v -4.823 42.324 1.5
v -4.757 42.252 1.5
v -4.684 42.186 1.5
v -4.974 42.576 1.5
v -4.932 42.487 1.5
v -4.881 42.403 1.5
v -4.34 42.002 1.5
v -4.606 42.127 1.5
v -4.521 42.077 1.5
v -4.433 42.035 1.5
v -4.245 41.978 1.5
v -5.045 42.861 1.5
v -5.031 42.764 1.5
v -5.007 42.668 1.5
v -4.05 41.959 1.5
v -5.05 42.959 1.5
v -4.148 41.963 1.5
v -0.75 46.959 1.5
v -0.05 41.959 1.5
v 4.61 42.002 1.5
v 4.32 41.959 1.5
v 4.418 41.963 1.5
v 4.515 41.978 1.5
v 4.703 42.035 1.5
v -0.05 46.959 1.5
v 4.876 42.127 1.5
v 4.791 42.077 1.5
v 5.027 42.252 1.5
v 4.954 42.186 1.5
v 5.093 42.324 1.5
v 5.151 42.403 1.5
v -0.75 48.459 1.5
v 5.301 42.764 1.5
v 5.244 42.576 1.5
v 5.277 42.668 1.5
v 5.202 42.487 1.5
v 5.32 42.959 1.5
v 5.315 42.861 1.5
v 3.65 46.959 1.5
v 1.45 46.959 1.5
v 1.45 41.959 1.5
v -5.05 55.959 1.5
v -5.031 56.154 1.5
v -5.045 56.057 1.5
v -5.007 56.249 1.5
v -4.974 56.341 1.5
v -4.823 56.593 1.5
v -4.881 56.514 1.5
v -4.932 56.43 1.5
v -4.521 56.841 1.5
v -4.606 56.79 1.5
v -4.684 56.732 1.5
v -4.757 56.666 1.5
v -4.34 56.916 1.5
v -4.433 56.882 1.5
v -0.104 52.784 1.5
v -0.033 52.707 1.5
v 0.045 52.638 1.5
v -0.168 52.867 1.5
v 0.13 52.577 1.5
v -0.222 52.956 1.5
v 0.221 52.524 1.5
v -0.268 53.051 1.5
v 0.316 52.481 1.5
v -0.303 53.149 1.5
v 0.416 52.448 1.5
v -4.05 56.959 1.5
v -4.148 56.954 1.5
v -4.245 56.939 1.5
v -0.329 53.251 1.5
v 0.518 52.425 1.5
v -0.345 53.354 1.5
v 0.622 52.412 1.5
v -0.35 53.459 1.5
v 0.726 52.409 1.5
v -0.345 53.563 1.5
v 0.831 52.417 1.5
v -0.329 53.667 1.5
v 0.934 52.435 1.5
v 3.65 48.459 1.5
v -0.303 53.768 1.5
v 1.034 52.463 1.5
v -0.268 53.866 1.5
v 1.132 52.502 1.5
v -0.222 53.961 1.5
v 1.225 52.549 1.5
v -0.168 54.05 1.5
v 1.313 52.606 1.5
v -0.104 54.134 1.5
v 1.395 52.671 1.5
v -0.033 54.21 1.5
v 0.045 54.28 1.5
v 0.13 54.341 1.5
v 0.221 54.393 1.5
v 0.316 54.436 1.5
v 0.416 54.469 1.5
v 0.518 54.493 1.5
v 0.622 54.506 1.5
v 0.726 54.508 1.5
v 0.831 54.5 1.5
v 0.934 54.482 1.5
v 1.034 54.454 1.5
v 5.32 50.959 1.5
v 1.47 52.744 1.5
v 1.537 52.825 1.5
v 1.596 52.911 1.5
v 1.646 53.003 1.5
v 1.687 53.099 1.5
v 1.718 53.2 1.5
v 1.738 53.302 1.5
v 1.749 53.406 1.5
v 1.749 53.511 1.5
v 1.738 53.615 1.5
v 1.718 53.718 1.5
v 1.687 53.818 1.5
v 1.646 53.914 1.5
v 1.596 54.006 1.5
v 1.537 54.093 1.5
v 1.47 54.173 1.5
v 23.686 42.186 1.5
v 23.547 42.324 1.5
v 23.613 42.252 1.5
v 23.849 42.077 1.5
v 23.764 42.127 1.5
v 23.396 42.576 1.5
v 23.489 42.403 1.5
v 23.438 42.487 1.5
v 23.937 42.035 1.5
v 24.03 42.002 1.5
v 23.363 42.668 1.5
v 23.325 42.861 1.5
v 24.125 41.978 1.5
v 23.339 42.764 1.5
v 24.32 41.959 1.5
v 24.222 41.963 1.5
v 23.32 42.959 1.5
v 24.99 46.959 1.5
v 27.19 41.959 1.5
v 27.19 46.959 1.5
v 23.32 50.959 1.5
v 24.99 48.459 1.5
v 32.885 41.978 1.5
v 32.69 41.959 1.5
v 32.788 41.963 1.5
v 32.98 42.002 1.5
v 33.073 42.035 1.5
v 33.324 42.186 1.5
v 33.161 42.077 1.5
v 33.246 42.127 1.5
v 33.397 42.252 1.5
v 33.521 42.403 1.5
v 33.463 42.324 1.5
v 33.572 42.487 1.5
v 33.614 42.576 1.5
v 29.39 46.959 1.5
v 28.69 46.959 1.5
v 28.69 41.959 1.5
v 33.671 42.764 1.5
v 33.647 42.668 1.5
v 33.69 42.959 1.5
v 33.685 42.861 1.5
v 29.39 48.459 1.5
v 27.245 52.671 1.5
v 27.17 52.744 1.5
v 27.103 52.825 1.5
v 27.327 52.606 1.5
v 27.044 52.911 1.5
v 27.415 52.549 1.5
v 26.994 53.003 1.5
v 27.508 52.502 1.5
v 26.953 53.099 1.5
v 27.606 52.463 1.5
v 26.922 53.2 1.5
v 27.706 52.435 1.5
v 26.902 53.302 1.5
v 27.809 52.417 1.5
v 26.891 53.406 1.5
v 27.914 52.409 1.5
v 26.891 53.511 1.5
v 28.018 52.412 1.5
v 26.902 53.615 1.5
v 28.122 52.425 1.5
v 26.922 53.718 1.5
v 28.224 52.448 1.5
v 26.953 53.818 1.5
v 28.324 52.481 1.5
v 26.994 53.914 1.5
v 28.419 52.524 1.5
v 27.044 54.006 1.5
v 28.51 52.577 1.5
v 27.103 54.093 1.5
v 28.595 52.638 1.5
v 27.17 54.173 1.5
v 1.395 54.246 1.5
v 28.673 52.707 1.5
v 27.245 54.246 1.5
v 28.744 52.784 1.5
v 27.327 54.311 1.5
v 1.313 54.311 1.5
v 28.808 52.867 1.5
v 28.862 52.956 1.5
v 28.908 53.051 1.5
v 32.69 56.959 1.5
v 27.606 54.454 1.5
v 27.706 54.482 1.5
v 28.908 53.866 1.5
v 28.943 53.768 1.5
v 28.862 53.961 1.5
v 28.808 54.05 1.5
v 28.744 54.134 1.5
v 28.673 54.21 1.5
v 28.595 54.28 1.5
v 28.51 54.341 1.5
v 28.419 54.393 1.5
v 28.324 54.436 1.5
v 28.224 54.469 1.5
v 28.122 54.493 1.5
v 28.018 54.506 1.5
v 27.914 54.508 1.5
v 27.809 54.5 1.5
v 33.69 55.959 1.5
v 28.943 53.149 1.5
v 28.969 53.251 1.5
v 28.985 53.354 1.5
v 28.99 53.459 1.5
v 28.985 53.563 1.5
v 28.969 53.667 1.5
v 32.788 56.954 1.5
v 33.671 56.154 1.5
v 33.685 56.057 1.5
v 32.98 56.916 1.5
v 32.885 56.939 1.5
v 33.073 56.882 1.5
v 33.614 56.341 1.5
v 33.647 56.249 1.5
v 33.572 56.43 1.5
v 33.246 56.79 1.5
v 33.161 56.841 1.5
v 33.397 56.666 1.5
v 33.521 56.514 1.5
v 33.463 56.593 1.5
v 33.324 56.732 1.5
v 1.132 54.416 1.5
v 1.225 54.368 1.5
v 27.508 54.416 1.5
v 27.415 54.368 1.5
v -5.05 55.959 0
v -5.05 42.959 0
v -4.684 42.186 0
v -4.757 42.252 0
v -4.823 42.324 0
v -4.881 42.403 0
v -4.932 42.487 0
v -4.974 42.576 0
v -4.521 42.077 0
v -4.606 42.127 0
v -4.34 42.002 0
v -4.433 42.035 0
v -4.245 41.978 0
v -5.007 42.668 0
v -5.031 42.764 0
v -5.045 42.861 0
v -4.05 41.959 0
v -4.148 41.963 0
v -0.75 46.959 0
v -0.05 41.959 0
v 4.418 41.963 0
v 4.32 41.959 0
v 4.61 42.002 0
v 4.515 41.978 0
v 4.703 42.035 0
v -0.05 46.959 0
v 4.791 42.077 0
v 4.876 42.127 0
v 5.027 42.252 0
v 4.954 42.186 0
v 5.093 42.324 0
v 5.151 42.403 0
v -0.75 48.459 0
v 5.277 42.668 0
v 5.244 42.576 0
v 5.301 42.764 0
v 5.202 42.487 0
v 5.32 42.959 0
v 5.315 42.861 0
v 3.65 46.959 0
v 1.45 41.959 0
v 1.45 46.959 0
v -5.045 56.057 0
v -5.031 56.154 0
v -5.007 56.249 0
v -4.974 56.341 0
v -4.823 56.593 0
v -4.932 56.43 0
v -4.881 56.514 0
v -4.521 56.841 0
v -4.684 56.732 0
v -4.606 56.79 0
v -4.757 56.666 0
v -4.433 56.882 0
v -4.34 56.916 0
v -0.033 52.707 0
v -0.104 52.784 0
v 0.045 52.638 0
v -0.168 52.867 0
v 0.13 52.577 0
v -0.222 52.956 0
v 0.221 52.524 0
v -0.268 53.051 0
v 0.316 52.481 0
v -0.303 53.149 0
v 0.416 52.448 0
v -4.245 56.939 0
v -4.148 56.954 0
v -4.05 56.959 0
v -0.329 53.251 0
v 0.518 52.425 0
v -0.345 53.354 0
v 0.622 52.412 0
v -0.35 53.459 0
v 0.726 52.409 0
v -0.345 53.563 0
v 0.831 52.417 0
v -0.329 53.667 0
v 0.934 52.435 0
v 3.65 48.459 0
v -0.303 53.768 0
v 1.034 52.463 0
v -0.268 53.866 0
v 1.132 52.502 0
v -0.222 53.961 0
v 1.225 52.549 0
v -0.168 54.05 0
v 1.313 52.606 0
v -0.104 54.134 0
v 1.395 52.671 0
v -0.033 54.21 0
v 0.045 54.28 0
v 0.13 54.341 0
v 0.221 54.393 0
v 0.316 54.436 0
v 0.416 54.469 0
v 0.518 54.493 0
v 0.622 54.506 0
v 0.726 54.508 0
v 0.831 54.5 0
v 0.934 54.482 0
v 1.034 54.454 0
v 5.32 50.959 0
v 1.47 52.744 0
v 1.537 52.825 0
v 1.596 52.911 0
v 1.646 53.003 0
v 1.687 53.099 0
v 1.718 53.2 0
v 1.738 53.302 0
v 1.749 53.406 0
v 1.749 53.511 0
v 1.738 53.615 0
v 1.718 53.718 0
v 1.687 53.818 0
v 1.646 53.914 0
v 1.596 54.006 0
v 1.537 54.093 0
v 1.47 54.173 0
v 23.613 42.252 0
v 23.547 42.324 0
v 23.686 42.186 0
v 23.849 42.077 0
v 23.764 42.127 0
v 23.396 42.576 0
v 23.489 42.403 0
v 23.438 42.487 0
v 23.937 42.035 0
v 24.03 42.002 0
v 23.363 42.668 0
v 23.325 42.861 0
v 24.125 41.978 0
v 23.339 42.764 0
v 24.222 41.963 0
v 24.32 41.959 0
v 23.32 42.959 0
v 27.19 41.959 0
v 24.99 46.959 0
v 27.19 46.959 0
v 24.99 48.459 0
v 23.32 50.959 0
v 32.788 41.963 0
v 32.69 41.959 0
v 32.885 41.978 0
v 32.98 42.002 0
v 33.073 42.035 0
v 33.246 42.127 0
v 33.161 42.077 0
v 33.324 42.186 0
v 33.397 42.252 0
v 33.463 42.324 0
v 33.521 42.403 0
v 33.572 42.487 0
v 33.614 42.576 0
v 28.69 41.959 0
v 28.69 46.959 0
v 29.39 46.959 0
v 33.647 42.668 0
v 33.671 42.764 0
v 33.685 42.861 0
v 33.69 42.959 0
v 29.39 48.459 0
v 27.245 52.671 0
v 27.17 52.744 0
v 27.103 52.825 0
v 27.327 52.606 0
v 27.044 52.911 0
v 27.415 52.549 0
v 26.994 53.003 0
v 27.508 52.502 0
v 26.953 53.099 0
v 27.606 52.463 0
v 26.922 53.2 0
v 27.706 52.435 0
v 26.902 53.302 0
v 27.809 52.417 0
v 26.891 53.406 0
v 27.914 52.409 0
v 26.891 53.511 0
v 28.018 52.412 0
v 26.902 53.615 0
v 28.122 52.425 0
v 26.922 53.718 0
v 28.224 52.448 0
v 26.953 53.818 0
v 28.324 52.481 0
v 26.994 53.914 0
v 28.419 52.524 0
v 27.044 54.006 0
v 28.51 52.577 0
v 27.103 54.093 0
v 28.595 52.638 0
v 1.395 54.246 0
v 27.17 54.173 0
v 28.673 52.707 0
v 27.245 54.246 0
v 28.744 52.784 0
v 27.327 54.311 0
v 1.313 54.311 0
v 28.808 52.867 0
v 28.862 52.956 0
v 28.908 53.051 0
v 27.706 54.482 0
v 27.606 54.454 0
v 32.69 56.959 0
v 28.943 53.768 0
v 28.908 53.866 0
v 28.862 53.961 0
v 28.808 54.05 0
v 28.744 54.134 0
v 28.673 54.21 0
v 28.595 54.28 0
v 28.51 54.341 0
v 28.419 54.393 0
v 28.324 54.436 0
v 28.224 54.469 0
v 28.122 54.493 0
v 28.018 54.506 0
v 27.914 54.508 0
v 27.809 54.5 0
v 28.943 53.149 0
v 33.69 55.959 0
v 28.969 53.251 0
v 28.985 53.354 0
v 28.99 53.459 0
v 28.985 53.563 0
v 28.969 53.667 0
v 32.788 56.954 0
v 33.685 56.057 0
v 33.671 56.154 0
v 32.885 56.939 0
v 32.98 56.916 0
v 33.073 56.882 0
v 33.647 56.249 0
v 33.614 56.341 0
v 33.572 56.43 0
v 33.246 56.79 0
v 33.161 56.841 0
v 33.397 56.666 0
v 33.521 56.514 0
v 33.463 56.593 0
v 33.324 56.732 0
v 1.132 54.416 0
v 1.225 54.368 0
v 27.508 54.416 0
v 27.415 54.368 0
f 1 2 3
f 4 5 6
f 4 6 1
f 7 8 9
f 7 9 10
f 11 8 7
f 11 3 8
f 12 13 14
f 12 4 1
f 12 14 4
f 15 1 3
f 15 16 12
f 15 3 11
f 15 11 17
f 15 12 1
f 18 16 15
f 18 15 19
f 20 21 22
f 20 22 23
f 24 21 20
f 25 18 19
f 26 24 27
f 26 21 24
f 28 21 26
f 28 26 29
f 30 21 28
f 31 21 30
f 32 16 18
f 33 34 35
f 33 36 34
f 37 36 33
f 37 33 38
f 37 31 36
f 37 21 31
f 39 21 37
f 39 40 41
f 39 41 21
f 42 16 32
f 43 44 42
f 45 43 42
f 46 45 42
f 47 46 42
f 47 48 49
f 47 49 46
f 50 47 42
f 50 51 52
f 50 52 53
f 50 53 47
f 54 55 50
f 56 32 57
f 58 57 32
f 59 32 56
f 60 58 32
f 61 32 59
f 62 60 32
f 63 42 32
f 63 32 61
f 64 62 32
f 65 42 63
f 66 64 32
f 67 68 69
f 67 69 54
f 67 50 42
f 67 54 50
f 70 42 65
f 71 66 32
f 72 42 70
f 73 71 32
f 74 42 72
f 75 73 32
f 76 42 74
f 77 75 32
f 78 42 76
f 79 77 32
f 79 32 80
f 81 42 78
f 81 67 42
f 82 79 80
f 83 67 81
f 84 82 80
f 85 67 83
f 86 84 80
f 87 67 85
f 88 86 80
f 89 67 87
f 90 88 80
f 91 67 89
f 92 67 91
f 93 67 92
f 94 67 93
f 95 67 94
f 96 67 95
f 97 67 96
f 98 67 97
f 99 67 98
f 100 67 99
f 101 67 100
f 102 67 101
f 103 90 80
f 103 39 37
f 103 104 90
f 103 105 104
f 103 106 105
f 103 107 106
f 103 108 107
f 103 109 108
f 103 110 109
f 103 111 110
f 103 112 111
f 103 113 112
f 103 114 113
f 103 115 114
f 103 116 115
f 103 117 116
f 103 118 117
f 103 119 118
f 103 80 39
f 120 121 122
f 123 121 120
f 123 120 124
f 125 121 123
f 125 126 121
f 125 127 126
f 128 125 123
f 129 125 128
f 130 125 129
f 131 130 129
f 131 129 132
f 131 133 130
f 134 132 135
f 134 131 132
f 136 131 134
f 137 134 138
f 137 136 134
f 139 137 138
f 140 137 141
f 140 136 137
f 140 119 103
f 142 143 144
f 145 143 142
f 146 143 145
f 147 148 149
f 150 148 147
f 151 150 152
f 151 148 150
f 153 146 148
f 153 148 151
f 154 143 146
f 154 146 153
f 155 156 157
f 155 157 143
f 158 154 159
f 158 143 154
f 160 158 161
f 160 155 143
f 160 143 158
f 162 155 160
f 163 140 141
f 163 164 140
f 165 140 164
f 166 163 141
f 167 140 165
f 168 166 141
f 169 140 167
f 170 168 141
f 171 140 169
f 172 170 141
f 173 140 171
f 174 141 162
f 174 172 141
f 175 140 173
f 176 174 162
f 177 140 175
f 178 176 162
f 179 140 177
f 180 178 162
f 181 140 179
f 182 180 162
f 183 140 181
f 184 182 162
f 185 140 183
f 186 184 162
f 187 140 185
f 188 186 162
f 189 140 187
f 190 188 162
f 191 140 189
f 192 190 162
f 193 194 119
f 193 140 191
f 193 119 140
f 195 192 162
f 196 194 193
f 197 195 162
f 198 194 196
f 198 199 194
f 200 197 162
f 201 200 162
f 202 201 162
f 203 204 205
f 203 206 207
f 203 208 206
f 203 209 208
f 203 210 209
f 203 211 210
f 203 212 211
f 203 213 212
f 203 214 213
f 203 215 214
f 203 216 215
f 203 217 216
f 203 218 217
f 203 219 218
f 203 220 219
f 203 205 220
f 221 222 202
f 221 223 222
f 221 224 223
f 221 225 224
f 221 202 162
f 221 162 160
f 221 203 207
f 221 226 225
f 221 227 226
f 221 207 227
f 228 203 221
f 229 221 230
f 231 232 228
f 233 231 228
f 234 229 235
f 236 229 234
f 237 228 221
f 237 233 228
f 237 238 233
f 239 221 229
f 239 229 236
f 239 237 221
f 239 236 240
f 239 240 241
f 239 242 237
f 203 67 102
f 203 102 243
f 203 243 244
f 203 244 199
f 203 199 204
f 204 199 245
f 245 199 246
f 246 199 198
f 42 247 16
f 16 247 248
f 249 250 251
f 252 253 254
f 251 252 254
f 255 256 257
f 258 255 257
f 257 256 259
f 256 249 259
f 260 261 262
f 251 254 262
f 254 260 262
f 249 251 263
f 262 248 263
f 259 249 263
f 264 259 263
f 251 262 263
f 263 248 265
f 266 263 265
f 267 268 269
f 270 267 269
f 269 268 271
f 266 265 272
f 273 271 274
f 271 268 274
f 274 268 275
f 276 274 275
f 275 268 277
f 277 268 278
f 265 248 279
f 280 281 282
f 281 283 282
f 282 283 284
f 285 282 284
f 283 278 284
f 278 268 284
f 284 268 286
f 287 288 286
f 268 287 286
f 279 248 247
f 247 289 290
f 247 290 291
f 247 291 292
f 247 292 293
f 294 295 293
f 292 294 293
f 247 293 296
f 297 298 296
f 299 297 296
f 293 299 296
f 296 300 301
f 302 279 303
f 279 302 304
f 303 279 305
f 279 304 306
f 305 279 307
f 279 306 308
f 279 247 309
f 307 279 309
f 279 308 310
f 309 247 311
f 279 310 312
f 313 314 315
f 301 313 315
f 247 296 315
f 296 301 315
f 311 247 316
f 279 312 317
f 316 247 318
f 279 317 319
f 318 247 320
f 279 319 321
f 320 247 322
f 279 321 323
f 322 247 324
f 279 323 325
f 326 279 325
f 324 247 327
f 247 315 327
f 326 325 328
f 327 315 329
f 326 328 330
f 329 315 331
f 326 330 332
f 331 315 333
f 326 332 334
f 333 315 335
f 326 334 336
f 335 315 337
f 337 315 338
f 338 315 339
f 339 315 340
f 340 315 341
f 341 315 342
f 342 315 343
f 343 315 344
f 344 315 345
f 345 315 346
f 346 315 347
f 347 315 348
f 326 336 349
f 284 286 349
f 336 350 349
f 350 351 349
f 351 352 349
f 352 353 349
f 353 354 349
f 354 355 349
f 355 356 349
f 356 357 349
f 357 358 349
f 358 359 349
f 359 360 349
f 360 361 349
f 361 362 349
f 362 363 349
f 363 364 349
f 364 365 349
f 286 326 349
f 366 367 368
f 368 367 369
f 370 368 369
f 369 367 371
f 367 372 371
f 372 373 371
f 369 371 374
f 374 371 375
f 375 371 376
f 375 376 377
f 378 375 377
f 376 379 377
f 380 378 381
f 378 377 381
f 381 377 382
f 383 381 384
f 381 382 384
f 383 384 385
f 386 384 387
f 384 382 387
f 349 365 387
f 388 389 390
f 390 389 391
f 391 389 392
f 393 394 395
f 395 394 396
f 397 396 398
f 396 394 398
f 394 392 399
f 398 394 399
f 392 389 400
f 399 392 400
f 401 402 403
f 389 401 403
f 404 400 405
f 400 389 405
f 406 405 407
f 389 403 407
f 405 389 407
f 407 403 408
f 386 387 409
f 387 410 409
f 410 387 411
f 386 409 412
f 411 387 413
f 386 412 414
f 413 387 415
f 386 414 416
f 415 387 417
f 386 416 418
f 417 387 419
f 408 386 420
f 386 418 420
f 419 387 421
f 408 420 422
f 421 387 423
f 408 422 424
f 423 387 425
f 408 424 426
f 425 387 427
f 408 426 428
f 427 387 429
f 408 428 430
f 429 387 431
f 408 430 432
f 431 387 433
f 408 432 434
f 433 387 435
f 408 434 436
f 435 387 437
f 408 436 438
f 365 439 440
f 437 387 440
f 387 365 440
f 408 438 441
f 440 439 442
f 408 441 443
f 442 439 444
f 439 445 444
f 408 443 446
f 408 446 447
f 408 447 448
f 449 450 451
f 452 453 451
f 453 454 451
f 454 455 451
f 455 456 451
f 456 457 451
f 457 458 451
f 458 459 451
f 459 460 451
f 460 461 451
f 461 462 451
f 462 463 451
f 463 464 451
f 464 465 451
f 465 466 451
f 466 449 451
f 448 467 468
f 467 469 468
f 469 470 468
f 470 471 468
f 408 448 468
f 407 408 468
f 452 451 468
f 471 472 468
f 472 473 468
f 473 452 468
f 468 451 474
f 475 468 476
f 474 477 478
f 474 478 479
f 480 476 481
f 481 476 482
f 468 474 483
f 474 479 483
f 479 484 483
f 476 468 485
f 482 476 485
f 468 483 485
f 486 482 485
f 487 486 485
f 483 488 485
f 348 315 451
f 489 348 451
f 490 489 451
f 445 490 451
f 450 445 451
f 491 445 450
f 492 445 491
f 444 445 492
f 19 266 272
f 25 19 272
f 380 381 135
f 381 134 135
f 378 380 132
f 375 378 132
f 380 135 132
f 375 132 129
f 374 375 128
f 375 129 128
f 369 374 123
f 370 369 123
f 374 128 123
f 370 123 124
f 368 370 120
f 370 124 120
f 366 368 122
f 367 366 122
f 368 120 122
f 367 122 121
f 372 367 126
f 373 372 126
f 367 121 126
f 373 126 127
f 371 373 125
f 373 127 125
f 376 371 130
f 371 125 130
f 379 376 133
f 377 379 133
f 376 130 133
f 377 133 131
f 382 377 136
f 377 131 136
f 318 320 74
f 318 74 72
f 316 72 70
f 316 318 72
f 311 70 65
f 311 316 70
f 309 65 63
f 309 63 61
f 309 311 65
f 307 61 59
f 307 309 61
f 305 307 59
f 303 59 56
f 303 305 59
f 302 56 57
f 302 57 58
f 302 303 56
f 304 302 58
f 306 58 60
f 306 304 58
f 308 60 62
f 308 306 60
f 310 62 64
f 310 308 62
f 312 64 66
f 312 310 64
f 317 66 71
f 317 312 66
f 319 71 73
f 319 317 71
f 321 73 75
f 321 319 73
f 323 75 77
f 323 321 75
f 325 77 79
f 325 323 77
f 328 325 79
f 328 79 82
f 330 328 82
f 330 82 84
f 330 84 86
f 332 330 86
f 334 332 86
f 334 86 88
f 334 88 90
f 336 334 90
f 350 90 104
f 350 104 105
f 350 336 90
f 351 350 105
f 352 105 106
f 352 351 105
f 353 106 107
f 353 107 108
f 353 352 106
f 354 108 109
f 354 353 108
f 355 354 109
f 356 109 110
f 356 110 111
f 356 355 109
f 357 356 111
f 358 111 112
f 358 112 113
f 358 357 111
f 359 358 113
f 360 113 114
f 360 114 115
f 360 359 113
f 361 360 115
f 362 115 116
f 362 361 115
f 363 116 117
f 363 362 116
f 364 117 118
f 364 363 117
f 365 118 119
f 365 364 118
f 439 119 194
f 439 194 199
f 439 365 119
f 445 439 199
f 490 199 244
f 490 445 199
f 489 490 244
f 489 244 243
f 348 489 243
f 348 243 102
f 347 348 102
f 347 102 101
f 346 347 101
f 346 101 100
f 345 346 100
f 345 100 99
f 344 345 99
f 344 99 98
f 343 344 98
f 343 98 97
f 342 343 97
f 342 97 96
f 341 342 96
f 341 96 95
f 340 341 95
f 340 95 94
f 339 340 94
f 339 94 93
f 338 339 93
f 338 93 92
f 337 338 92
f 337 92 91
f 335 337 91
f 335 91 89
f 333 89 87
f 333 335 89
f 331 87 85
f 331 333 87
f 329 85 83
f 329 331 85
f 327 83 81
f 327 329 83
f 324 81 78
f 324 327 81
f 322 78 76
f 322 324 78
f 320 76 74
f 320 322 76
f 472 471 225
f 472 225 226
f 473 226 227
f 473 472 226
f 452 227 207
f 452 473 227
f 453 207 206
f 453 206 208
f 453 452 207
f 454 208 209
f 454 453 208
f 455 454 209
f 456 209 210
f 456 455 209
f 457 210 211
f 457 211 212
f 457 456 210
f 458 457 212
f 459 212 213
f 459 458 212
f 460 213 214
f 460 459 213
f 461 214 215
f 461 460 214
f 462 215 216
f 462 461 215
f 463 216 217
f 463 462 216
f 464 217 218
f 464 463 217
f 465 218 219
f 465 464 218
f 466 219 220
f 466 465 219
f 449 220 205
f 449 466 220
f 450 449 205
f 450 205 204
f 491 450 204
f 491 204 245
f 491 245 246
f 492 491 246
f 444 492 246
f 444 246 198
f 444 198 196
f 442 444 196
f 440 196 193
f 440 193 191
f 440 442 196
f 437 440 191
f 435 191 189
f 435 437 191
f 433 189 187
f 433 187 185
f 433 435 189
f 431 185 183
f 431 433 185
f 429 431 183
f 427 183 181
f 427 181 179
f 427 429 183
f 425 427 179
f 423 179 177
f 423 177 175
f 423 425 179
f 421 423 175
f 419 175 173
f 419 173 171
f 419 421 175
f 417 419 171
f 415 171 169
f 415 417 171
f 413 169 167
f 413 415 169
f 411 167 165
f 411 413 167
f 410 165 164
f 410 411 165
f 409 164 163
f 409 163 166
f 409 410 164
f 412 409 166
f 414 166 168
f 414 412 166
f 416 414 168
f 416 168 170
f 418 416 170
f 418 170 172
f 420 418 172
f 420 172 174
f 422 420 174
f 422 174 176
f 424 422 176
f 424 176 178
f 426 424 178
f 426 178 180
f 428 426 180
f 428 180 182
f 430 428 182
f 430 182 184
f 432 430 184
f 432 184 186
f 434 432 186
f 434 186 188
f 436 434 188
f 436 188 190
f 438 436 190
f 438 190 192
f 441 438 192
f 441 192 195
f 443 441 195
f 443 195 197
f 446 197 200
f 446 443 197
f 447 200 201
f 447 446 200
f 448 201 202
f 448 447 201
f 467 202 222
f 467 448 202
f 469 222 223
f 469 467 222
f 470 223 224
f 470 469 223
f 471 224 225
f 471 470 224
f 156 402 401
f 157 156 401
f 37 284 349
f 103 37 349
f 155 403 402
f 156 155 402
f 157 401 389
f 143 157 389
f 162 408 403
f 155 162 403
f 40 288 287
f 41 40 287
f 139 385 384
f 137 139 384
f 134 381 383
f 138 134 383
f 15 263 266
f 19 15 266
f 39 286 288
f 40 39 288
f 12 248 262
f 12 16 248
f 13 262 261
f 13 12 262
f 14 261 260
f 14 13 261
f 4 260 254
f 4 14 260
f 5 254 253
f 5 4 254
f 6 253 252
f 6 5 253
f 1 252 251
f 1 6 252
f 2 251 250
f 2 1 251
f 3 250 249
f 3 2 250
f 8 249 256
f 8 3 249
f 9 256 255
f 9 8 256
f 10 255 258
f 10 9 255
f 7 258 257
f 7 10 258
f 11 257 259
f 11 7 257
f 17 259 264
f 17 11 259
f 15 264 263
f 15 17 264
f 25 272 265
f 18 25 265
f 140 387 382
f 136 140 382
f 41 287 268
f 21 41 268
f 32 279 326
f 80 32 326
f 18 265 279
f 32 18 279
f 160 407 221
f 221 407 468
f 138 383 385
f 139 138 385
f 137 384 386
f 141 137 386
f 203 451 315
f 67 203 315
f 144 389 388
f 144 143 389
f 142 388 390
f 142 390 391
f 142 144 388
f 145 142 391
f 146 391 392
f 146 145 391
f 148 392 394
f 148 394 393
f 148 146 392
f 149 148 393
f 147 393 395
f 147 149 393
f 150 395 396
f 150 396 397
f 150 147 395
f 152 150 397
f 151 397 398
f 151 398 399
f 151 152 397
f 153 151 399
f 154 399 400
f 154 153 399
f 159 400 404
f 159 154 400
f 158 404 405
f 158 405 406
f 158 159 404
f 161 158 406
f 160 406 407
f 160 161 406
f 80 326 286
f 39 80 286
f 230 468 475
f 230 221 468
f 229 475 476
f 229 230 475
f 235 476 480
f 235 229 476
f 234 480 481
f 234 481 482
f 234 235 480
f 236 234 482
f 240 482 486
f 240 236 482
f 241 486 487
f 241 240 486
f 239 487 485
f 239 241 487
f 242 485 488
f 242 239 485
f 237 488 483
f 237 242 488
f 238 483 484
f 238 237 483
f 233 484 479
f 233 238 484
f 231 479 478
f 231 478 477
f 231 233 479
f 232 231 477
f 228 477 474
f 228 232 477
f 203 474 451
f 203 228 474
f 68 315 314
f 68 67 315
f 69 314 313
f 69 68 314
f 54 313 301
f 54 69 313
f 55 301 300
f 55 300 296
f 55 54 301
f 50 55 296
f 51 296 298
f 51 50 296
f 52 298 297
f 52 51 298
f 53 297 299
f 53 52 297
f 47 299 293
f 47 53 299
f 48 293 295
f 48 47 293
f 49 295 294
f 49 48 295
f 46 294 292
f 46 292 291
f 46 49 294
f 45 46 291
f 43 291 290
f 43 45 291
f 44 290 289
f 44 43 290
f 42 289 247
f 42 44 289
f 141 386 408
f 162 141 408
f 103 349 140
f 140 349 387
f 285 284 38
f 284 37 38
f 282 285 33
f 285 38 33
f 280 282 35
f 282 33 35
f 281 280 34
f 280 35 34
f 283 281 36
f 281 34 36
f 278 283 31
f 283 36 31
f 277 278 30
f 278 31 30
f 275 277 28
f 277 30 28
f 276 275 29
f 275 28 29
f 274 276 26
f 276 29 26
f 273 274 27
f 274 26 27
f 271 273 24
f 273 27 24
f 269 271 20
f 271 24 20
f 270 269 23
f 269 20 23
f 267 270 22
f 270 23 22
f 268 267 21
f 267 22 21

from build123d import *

# Parameters (mm, degrees)
SKETCH_1_R      = 1.05
EXTRUDE_1_DEPTH = 1.5
FILLET_1_R      = 1


with BuildPart() as part:
    # 草图1 → 凸台-拉伸1 (new body)
    with BuildSketch(Plane.XY):
        Polygon((23.32, 41.958612035), (27.19, 41.958612035), (27.19, 46.958612035), (24.99, 46.958612035), (24.99, 48.458612035), (29.39, 48.458612035), (29.39, 46.958612035), (28.69, 46.958612035), (28.69, 41.958612035), (33.69, 41.958612035), (33.69, 56.958612035), (14.32, 56.958612035), (-5.05, 56.958612035), (-5.05, 41.958612035), (-0.05, 41.958612035), (-0.05, 46.958612035), (-0.75, 46.958612035), (-0.75, 48.458612035), (3.65, 48.458612035), (3.65, 46.958612035), (1.45, 46.958612035), (1.45, 41.958612035), (5.32, 41.958612035), (5.32, 50.958612035), (23.32, 50.958612035), align=None)
        with Locations((27.94, 53.458612035)):
            Circle(SKETCH_1_R, mode=Mode.SUBTRACT)
        with Locations(Location((0.7, 53.458612035, 0), (0, 0, 180))):
            Circle(SKETCH_1_R, mode=Mode.SUBTRACT)
    extrude(amount=EXTRUDE_1_DEPTH)

    # 圆角1
    fillet_1_edges = [part.edges().sort_by_distance(p)[0] for p in [
        (-5.05, 41.958612035, 0.75),
        (-5.05, 56.958612035, 0.75),
        (33.69, 56.958612035, 0.75),
        (33.69, 41.958612035, 0.75),
        (23.32, 41.958612035, 0.75),
        (5.32, 41.958612035, 0.75),
    ]]
    fillet(fillet_1_edges, radius=FILLET_1_R)


solid = part.part
